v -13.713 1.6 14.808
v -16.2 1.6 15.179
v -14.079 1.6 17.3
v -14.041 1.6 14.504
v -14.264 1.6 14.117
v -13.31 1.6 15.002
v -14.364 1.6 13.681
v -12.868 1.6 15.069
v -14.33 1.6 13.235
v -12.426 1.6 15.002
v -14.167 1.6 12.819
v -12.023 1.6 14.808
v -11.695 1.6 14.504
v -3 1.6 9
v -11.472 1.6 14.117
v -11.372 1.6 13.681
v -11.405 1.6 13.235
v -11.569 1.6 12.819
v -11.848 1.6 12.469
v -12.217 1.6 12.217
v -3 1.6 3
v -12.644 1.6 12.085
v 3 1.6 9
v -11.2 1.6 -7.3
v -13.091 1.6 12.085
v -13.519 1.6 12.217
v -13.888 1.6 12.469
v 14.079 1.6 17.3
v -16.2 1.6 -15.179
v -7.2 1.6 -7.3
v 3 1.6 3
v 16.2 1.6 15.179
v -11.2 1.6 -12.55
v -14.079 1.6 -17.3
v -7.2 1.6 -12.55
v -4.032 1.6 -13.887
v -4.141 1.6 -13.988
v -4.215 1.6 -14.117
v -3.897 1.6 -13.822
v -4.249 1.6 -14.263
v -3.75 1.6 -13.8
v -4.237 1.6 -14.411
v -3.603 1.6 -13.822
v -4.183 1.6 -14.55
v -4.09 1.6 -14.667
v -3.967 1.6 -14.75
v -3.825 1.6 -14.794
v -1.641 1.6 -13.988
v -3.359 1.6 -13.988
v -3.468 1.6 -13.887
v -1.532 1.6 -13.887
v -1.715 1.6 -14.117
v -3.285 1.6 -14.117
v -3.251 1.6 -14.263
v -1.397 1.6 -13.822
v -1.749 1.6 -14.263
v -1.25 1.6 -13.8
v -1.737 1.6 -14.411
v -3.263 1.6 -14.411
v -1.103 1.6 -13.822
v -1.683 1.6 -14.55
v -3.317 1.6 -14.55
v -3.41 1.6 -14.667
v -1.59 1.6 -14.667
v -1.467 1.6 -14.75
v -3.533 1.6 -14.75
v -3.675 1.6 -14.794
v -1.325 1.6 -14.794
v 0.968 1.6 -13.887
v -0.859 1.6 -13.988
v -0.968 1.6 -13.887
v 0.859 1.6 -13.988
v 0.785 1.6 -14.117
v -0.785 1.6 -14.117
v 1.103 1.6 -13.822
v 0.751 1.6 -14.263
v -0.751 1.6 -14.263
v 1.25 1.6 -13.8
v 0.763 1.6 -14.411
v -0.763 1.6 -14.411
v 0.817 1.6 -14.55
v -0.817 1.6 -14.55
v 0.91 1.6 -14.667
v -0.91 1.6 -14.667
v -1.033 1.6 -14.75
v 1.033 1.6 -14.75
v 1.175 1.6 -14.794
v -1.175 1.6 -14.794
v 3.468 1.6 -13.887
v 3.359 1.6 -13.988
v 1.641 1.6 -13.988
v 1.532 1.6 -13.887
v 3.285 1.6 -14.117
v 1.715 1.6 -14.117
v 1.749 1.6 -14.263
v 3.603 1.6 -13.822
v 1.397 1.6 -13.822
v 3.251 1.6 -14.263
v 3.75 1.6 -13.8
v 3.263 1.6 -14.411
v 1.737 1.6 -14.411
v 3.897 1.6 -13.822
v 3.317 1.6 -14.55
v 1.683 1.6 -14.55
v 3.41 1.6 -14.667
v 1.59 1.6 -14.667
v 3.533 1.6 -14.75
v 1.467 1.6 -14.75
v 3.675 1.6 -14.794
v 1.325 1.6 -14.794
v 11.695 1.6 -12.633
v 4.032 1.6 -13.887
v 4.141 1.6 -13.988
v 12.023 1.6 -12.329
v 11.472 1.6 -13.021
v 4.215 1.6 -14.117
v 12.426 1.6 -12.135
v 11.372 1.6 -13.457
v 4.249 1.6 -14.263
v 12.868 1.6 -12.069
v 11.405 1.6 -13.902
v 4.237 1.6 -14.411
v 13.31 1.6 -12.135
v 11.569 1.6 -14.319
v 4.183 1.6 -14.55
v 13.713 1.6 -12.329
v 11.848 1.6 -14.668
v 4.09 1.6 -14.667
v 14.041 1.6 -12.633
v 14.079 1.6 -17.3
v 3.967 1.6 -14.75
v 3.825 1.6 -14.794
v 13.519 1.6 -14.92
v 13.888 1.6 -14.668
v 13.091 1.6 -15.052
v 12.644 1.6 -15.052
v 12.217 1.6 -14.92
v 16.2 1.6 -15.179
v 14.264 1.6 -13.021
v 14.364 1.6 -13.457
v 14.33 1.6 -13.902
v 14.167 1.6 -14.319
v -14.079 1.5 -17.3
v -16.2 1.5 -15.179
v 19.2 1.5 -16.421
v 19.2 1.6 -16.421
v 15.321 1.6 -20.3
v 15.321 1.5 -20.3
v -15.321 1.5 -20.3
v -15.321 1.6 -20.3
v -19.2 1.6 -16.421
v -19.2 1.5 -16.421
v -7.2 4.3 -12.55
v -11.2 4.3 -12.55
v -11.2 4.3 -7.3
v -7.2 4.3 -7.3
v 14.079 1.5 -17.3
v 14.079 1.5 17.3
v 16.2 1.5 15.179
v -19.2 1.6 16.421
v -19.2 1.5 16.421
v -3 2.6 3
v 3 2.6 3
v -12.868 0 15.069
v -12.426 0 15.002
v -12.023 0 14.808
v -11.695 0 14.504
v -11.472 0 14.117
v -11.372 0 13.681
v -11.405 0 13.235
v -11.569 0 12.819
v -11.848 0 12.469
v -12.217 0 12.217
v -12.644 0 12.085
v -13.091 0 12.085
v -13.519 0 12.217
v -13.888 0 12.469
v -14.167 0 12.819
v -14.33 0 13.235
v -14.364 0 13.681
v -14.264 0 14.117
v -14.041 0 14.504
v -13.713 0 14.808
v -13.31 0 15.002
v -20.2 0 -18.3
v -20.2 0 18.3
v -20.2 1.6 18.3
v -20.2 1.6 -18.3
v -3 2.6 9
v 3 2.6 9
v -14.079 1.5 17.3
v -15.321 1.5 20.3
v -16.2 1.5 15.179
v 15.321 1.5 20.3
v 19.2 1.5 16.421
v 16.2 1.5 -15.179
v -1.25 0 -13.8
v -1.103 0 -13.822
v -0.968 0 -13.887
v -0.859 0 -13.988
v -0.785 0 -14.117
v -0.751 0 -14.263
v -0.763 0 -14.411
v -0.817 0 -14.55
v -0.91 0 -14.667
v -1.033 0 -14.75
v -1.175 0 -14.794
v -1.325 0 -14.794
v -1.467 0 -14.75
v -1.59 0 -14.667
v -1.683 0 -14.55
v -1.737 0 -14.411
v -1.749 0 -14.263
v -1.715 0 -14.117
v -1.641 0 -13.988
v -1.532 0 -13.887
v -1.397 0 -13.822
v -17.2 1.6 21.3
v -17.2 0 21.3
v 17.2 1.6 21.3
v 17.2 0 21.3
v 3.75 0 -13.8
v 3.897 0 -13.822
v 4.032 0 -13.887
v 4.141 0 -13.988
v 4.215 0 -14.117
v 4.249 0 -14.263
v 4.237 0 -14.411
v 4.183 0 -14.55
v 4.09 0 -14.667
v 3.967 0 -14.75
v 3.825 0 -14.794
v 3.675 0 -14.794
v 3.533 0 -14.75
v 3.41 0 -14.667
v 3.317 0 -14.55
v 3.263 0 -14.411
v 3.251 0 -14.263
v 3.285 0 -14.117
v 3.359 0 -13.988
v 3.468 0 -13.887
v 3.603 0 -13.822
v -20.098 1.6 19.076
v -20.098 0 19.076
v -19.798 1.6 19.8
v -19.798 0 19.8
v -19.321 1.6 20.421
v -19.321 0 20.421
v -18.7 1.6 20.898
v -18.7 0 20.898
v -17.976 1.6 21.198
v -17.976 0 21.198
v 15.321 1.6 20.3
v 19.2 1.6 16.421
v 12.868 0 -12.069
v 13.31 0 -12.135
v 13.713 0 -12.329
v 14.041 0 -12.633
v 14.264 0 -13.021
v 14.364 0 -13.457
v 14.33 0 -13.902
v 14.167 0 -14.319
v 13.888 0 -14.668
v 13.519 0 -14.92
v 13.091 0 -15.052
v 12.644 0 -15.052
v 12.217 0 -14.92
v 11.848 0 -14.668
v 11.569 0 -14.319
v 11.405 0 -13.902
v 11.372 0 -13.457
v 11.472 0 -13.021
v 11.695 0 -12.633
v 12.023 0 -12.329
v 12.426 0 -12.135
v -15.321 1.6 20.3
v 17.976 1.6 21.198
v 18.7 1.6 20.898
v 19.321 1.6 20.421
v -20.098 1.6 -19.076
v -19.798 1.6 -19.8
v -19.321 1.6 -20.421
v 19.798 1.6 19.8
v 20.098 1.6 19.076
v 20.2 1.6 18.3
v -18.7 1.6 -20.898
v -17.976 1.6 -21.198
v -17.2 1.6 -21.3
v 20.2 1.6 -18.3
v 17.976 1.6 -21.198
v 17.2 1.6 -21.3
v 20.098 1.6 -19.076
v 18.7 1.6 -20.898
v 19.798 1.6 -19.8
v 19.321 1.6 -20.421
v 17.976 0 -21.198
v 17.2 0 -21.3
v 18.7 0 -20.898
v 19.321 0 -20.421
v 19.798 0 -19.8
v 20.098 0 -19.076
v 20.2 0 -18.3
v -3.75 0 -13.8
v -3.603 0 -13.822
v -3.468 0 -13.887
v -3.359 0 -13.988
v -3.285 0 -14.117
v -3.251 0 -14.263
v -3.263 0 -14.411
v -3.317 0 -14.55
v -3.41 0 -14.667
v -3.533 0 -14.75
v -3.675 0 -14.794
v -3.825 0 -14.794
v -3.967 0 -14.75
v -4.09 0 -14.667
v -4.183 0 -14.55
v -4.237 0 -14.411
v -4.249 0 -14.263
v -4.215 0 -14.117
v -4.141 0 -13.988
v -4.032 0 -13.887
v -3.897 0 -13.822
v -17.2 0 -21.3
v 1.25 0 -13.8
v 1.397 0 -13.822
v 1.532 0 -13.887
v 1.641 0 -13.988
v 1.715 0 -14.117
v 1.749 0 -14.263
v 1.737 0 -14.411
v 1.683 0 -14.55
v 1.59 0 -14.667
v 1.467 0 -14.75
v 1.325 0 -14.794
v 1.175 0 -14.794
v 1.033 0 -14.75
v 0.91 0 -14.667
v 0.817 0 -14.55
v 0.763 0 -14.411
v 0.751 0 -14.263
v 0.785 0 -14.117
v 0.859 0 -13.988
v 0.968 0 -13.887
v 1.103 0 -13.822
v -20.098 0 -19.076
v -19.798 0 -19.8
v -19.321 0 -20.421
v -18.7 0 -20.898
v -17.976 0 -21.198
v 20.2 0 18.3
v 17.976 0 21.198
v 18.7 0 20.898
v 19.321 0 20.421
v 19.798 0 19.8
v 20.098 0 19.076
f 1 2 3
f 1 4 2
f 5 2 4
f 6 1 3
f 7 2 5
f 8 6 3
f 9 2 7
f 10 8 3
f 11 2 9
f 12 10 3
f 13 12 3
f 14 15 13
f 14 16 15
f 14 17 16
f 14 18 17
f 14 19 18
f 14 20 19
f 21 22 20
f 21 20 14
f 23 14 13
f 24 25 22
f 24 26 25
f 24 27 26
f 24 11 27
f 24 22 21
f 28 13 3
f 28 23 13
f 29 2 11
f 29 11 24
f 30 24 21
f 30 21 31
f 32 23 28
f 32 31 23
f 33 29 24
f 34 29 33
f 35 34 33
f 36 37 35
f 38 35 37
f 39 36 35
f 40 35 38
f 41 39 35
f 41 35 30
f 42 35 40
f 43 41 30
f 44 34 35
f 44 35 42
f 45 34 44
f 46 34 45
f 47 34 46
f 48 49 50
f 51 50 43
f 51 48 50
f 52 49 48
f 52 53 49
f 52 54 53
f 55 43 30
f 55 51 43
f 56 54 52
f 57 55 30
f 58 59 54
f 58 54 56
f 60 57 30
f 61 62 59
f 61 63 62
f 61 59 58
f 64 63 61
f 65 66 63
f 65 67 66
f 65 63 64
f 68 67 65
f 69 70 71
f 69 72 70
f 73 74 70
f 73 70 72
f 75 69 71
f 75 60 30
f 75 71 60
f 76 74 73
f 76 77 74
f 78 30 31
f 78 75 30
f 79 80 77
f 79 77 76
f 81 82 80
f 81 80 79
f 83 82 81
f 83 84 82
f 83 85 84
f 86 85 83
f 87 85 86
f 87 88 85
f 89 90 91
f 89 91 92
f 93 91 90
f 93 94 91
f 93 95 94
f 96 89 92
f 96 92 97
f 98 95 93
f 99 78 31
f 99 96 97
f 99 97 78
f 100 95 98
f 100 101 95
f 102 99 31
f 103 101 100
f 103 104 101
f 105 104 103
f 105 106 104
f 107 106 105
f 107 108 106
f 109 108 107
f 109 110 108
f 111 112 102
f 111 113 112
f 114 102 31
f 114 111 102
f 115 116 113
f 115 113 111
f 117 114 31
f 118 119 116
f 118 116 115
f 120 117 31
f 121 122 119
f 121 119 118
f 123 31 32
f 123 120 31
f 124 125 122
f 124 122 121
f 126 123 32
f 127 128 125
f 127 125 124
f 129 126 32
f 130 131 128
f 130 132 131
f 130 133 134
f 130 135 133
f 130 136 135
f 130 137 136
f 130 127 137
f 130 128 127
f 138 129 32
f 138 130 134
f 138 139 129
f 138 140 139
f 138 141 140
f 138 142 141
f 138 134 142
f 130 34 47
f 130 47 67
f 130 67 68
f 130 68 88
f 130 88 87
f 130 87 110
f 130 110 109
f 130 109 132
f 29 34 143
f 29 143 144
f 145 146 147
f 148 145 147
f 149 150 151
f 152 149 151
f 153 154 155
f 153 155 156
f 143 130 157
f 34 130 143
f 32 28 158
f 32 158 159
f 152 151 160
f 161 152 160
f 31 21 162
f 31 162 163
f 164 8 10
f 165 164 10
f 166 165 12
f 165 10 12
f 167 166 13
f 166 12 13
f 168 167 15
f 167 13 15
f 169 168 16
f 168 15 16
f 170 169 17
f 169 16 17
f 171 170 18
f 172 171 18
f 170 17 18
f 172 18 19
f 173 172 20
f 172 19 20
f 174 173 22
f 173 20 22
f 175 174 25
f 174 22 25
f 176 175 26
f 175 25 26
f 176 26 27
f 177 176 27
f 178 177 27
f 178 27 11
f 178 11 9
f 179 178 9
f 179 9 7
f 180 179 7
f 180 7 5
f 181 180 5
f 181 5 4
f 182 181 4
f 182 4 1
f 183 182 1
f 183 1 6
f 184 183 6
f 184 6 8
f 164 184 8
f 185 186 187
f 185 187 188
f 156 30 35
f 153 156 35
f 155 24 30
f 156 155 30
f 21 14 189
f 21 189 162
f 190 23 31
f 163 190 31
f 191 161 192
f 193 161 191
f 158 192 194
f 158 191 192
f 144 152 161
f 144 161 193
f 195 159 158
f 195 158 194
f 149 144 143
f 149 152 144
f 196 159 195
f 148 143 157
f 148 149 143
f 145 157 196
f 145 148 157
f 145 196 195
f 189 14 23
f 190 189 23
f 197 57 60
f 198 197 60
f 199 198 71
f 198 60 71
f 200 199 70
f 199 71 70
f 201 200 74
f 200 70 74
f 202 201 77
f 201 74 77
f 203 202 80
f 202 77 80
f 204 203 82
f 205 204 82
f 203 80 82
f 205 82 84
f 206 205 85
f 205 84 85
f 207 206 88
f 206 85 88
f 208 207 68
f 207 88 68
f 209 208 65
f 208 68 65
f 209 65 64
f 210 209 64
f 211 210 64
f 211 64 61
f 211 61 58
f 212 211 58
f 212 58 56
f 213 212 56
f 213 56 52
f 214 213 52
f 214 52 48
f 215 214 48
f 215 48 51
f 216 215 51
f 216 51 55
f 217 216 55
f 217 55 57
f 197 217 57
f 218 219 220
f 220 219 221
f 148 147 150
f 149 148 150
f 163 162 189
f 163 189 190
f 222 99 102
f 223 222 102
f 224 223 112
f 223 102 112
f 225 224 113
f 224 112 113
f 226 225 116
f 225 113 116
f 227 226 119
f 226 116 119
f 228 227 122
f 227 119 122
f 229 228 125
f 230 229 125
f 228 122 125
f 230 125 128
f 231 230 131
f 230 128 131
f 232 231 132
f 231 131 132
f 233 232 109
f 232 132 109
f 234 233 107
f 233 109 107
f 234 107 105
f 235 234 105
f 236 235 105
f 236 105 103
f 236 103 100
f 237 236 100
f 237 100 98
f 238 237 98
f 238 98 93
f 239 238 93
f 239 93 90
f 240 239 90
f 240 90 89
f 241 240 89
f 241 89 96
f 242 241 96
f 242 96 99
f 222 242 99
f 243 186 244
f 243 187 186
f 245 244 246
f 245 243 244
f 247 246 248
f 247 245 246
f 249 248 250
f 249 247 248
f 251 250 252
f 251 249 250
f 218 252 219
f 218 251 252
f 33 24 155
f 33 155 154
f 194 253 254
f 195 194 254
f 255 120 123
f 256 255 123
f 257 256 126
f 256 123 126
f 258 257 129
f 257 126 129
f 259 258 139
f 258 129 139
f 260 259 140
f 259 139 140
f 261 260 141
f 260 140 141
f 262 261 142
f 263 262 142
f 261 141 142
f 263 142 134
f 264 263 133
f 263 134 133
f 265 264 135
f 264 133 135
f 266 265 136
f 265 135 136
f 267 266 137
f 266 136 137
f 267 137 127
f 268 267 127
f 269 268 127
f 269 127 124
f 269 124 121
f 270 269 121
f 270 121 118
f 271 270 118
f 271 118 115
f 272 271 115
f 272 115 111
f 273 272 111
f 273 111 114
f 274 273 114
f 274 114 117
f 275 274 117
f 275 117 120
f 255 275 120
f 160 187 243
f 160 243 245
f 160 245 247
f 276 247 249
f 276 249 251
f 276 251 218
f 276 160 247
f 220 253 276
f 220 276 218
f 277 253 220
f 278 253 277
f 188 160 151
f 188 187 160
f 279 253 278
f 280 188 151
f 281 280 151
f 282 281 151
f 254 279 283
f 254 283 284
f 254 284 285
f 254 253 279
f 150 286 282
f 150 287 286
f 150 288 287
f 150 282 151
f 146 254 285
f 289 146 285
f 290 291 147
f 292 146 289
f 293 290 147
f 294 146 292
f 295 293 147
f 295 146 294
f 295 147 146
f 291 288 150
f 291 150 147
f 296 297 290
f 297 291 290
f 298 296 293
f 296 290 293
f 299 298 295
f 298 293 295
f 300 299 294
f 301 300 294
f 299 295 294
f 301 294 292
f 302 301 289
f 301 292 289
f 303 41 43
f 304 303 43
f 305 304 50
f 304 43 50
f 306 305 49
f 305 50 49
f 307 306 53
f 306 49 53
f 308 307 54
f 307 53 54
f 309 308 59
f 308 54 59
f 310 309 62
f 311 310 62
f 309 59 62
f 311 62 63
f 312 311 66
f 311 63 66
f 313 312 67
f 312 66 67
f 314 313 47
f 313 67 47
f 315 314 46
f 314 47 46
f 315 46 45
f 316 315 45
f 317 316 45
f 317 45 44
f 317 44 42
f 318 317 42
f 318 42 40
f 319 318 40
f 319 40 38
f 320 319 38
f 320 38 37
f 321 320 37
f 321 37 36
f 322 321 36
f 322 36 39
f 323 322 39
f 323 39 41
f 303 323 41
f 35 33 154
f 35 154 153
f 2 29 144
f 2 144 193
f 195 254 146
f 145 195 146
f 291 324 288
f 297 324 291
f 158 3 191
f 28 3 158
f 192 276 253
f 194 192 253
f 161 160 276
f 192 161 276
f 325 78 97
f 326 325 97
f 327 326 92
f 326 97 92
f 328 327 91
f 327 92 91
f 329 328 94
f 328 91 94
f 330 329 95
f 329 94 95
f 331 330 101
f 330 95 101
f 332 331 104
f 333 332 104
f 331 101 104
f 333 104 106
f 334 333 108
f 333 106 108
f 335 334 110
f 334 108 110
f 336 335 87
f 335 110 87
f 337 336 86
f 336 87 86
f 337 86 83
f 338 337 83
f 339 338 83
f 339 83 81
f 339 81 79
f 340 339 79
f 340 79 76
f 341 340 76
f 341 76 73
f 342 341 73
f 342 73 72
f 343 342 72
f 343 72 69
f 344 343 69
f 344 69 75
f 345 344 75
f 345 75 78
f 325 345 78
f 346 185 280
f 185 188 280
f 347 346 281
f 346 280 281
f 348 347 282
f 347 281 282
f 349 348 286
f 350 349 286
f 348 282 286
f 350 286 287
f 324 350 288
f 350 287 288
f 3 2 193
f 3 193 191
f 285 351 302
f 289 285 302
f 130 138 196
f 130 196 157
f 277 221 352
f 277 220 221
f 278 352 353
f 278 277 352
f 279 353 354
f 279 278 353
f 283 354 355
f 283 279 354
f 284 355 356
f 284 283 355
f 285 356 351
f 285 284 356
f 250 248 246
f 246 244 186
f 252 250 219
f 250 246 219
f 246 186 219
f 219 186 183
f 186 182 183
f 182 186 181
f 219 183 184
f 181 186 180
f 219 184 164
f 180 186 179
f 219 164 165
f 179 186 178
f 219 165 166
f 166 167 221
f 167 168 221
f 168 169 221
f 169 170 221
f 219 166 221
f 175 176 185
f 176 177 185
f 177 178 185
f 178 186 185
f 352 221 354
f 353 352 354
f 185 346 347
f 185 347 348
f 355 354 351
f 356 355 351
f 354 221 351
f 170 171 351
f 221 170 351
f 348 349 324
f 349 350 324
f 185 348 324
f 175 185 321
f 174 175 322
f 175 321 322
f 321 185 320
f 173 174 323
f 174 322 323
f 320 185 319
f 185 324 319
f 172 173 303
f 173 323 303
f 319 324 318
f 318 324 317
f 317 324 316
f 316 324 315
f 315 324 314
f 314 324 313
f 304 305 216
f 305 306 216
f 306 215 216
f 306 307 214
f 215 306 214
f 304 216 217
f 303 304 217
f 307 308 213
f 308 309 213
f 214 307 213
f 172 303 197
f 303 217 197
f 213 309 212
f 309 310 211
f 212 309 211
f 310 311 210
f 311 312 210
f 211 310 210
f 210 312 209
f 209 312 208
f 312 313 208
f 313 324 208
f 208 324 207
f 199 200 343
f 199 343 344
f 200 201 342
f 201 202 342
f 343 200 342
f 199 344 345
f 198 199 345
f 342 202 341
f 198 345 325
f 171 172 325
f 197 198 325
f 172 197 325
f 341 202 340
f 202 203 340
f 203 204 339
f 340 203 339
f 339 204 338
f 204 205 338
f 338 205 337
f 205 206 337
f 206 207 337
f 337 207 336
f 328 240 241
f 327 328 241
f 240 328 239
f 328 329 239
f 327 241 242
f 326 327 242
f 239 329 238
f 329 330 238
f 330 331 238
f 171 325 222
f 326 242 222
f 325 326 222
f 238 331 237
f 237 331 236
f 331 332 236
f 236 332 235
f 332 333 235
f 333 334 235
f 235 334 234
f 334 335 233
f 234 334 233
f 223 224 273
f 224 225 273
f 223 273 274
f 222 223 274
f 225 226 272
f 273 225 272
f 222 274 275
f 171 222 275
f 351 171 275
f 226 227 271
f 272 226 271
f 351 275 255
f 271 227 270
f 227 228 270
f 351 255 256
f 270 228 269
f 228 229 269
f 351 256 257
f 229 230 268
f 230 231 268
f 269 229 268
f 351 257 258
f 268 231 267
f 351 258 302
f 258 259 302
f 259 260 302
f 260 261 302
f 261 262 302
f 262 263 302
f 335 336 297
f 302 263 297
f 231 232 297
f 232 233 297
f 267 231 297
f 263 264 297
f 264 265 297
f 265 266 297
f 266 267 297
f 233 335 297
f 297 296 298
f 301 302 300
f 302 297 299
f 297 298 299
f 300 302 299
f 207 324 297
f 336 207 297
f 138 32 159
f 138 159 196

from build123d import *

# Parameters (mm, degrees)
SKETCH1_W               = 40.4
SKETCH1_H               = 42.6
BOSS_EXTRUDE1_DEPTH     = 1.6
SKETCH2_R               = 1.5
CUT_EXTRUDE1_DEPTH      = 30.3988095
CUT_EXTRUDE_THIN2_DEPTH = 0.1
FILLET1_R               = 3
SKETCH3_W               = 4
SKETCH3_H               = 5.25
BOSS_EXTRUDE2_DEPTH     = 2.7
SKETCH4_W               = 6
SKETCH4_H               = 6
BOSS_EXTRUDE3_DEPTH     = 1
SKETCH6_R               = 0.5
CUT_EXTRUDE2_DEPTH      = 30.479145171


with BuildPart() as part:
    # Sketch1 → Boss-Extrude1 (new body)
    with BuildSketch(Plane(origin=(0, 0, 0), x_dir=(1, 0, 0), z_dir=(0, 1, 0))):
        Rectangle(SKETCH1_W, SKETCH1_H)
    extrude(amount=BOSS_EXTRUDE1_DEPTH)

    # Sketch2 → Cut-Extrude1 (cut, through all)
    with BuildSketch(Plane(origin=(0, 1.6, 0), x_dir=(1, 0, 0), z_dir=(0, 1, 0))):
        with Locations((12.867890888, 13.568617619)):
            Circle(SKETCH2_R)
        with Locations((-12.867890888, -13.568617619)):
            Circle(SKETCH2_R)
    extrude(amount=-CUT_EXTRUDE1_DEPTH, mode=Mode.SUBTRACT)

    # Sketch5 → Cut-Extrude-Thin2 (cut)
    with BuildSketch(Plane(origin=(0, 1.6, 0), x_dir=(1, 0, 0), z_dir=(0, 1, 0))):
        Polygon((-15.321320344, 20.3), (-19.2, 16.421320344), (-19.2, -16.421320344), (-15.321320344, -20.3), (15.321320344, -20.3), (19.2, -16.421320344), (19.2, 16.421320344), (15.321320344, 20.3), align=None)
        Polygon((-14.078679656, 17.3), (-16.2, 15.178679656), (-16.2, -15.178679656), (-14.078679656, -17.3), (14.078679656, -17.3), (16.2, -15.178679656), (16.2, 15.178679656), (14.078679656, 17.3), align=None, mode=Mode.SUBTRACT)
    extrude(amount=-CUT_EXTRUDE_THIN2_DEPTH, mode=Mode.SUBTRACT)

    # Fillet1
    fillet1_edges = [part.edges().sort_by_distance(p)[0] for p in [
        (20.2, 0.8, -21.3),
        (20.2, 0.8, 21.3),
        (-20.2, 0.8, 21.3),
        (-20.2, 0.8, -21.3),
    ]]
    fillet(fillet1_edges, radius=FILLET1_R)

    # Sketch3 → Boss-Extrude2 (add)
    with BuildSketch(Plane(origin=(0, 1.6, 0), x_dir=(1, 0, 0), z_dir=(0, 1, 0))):
        with Locations((-9.2, 9.925)):
            Rectangle(SKETCH3_W, SKETCH3_H)
    extrude(amount=BOSS_EXTRUDE2_DEPTH)

    # Sketch4 → Boss-Extrude3 (add)
    with BuildSketch(Plane(origin=(0, 1.6, 0), x_dir=(1, 0, 0), z_dir=(0, 1, 0))):
        with Locations((0, -6)):
            Rectangle(SKETCH4_W, SKETCH4_H)
    extrude(amount=BOSS_EXTRUDE3_DEPTH)

    # Sketch6 → Cut-Extrude2 (cut, through all)
    with BuildSketch(Plane(origin=(0, 1.6, 0), x_dir=(1, 0, 0), z_dir=(0, 1, 0))):
        with Locations((-3.75, 14.3)):
            Circle(SKETCH6_R)
        with Locations((-1.25, 14.3)):
            Circle(SKETCH6_R)
        with Locations((1.25, 14.3)):
            Circle(SKETCH6_R)
        with Locations((3.75, 14.3)):
            Circle(SKETCH6_R)
    extrude(amount=-CUT_EXTRUDE2_DEPTH, mode=Mode.SUBTRACT)


solid = part.part
